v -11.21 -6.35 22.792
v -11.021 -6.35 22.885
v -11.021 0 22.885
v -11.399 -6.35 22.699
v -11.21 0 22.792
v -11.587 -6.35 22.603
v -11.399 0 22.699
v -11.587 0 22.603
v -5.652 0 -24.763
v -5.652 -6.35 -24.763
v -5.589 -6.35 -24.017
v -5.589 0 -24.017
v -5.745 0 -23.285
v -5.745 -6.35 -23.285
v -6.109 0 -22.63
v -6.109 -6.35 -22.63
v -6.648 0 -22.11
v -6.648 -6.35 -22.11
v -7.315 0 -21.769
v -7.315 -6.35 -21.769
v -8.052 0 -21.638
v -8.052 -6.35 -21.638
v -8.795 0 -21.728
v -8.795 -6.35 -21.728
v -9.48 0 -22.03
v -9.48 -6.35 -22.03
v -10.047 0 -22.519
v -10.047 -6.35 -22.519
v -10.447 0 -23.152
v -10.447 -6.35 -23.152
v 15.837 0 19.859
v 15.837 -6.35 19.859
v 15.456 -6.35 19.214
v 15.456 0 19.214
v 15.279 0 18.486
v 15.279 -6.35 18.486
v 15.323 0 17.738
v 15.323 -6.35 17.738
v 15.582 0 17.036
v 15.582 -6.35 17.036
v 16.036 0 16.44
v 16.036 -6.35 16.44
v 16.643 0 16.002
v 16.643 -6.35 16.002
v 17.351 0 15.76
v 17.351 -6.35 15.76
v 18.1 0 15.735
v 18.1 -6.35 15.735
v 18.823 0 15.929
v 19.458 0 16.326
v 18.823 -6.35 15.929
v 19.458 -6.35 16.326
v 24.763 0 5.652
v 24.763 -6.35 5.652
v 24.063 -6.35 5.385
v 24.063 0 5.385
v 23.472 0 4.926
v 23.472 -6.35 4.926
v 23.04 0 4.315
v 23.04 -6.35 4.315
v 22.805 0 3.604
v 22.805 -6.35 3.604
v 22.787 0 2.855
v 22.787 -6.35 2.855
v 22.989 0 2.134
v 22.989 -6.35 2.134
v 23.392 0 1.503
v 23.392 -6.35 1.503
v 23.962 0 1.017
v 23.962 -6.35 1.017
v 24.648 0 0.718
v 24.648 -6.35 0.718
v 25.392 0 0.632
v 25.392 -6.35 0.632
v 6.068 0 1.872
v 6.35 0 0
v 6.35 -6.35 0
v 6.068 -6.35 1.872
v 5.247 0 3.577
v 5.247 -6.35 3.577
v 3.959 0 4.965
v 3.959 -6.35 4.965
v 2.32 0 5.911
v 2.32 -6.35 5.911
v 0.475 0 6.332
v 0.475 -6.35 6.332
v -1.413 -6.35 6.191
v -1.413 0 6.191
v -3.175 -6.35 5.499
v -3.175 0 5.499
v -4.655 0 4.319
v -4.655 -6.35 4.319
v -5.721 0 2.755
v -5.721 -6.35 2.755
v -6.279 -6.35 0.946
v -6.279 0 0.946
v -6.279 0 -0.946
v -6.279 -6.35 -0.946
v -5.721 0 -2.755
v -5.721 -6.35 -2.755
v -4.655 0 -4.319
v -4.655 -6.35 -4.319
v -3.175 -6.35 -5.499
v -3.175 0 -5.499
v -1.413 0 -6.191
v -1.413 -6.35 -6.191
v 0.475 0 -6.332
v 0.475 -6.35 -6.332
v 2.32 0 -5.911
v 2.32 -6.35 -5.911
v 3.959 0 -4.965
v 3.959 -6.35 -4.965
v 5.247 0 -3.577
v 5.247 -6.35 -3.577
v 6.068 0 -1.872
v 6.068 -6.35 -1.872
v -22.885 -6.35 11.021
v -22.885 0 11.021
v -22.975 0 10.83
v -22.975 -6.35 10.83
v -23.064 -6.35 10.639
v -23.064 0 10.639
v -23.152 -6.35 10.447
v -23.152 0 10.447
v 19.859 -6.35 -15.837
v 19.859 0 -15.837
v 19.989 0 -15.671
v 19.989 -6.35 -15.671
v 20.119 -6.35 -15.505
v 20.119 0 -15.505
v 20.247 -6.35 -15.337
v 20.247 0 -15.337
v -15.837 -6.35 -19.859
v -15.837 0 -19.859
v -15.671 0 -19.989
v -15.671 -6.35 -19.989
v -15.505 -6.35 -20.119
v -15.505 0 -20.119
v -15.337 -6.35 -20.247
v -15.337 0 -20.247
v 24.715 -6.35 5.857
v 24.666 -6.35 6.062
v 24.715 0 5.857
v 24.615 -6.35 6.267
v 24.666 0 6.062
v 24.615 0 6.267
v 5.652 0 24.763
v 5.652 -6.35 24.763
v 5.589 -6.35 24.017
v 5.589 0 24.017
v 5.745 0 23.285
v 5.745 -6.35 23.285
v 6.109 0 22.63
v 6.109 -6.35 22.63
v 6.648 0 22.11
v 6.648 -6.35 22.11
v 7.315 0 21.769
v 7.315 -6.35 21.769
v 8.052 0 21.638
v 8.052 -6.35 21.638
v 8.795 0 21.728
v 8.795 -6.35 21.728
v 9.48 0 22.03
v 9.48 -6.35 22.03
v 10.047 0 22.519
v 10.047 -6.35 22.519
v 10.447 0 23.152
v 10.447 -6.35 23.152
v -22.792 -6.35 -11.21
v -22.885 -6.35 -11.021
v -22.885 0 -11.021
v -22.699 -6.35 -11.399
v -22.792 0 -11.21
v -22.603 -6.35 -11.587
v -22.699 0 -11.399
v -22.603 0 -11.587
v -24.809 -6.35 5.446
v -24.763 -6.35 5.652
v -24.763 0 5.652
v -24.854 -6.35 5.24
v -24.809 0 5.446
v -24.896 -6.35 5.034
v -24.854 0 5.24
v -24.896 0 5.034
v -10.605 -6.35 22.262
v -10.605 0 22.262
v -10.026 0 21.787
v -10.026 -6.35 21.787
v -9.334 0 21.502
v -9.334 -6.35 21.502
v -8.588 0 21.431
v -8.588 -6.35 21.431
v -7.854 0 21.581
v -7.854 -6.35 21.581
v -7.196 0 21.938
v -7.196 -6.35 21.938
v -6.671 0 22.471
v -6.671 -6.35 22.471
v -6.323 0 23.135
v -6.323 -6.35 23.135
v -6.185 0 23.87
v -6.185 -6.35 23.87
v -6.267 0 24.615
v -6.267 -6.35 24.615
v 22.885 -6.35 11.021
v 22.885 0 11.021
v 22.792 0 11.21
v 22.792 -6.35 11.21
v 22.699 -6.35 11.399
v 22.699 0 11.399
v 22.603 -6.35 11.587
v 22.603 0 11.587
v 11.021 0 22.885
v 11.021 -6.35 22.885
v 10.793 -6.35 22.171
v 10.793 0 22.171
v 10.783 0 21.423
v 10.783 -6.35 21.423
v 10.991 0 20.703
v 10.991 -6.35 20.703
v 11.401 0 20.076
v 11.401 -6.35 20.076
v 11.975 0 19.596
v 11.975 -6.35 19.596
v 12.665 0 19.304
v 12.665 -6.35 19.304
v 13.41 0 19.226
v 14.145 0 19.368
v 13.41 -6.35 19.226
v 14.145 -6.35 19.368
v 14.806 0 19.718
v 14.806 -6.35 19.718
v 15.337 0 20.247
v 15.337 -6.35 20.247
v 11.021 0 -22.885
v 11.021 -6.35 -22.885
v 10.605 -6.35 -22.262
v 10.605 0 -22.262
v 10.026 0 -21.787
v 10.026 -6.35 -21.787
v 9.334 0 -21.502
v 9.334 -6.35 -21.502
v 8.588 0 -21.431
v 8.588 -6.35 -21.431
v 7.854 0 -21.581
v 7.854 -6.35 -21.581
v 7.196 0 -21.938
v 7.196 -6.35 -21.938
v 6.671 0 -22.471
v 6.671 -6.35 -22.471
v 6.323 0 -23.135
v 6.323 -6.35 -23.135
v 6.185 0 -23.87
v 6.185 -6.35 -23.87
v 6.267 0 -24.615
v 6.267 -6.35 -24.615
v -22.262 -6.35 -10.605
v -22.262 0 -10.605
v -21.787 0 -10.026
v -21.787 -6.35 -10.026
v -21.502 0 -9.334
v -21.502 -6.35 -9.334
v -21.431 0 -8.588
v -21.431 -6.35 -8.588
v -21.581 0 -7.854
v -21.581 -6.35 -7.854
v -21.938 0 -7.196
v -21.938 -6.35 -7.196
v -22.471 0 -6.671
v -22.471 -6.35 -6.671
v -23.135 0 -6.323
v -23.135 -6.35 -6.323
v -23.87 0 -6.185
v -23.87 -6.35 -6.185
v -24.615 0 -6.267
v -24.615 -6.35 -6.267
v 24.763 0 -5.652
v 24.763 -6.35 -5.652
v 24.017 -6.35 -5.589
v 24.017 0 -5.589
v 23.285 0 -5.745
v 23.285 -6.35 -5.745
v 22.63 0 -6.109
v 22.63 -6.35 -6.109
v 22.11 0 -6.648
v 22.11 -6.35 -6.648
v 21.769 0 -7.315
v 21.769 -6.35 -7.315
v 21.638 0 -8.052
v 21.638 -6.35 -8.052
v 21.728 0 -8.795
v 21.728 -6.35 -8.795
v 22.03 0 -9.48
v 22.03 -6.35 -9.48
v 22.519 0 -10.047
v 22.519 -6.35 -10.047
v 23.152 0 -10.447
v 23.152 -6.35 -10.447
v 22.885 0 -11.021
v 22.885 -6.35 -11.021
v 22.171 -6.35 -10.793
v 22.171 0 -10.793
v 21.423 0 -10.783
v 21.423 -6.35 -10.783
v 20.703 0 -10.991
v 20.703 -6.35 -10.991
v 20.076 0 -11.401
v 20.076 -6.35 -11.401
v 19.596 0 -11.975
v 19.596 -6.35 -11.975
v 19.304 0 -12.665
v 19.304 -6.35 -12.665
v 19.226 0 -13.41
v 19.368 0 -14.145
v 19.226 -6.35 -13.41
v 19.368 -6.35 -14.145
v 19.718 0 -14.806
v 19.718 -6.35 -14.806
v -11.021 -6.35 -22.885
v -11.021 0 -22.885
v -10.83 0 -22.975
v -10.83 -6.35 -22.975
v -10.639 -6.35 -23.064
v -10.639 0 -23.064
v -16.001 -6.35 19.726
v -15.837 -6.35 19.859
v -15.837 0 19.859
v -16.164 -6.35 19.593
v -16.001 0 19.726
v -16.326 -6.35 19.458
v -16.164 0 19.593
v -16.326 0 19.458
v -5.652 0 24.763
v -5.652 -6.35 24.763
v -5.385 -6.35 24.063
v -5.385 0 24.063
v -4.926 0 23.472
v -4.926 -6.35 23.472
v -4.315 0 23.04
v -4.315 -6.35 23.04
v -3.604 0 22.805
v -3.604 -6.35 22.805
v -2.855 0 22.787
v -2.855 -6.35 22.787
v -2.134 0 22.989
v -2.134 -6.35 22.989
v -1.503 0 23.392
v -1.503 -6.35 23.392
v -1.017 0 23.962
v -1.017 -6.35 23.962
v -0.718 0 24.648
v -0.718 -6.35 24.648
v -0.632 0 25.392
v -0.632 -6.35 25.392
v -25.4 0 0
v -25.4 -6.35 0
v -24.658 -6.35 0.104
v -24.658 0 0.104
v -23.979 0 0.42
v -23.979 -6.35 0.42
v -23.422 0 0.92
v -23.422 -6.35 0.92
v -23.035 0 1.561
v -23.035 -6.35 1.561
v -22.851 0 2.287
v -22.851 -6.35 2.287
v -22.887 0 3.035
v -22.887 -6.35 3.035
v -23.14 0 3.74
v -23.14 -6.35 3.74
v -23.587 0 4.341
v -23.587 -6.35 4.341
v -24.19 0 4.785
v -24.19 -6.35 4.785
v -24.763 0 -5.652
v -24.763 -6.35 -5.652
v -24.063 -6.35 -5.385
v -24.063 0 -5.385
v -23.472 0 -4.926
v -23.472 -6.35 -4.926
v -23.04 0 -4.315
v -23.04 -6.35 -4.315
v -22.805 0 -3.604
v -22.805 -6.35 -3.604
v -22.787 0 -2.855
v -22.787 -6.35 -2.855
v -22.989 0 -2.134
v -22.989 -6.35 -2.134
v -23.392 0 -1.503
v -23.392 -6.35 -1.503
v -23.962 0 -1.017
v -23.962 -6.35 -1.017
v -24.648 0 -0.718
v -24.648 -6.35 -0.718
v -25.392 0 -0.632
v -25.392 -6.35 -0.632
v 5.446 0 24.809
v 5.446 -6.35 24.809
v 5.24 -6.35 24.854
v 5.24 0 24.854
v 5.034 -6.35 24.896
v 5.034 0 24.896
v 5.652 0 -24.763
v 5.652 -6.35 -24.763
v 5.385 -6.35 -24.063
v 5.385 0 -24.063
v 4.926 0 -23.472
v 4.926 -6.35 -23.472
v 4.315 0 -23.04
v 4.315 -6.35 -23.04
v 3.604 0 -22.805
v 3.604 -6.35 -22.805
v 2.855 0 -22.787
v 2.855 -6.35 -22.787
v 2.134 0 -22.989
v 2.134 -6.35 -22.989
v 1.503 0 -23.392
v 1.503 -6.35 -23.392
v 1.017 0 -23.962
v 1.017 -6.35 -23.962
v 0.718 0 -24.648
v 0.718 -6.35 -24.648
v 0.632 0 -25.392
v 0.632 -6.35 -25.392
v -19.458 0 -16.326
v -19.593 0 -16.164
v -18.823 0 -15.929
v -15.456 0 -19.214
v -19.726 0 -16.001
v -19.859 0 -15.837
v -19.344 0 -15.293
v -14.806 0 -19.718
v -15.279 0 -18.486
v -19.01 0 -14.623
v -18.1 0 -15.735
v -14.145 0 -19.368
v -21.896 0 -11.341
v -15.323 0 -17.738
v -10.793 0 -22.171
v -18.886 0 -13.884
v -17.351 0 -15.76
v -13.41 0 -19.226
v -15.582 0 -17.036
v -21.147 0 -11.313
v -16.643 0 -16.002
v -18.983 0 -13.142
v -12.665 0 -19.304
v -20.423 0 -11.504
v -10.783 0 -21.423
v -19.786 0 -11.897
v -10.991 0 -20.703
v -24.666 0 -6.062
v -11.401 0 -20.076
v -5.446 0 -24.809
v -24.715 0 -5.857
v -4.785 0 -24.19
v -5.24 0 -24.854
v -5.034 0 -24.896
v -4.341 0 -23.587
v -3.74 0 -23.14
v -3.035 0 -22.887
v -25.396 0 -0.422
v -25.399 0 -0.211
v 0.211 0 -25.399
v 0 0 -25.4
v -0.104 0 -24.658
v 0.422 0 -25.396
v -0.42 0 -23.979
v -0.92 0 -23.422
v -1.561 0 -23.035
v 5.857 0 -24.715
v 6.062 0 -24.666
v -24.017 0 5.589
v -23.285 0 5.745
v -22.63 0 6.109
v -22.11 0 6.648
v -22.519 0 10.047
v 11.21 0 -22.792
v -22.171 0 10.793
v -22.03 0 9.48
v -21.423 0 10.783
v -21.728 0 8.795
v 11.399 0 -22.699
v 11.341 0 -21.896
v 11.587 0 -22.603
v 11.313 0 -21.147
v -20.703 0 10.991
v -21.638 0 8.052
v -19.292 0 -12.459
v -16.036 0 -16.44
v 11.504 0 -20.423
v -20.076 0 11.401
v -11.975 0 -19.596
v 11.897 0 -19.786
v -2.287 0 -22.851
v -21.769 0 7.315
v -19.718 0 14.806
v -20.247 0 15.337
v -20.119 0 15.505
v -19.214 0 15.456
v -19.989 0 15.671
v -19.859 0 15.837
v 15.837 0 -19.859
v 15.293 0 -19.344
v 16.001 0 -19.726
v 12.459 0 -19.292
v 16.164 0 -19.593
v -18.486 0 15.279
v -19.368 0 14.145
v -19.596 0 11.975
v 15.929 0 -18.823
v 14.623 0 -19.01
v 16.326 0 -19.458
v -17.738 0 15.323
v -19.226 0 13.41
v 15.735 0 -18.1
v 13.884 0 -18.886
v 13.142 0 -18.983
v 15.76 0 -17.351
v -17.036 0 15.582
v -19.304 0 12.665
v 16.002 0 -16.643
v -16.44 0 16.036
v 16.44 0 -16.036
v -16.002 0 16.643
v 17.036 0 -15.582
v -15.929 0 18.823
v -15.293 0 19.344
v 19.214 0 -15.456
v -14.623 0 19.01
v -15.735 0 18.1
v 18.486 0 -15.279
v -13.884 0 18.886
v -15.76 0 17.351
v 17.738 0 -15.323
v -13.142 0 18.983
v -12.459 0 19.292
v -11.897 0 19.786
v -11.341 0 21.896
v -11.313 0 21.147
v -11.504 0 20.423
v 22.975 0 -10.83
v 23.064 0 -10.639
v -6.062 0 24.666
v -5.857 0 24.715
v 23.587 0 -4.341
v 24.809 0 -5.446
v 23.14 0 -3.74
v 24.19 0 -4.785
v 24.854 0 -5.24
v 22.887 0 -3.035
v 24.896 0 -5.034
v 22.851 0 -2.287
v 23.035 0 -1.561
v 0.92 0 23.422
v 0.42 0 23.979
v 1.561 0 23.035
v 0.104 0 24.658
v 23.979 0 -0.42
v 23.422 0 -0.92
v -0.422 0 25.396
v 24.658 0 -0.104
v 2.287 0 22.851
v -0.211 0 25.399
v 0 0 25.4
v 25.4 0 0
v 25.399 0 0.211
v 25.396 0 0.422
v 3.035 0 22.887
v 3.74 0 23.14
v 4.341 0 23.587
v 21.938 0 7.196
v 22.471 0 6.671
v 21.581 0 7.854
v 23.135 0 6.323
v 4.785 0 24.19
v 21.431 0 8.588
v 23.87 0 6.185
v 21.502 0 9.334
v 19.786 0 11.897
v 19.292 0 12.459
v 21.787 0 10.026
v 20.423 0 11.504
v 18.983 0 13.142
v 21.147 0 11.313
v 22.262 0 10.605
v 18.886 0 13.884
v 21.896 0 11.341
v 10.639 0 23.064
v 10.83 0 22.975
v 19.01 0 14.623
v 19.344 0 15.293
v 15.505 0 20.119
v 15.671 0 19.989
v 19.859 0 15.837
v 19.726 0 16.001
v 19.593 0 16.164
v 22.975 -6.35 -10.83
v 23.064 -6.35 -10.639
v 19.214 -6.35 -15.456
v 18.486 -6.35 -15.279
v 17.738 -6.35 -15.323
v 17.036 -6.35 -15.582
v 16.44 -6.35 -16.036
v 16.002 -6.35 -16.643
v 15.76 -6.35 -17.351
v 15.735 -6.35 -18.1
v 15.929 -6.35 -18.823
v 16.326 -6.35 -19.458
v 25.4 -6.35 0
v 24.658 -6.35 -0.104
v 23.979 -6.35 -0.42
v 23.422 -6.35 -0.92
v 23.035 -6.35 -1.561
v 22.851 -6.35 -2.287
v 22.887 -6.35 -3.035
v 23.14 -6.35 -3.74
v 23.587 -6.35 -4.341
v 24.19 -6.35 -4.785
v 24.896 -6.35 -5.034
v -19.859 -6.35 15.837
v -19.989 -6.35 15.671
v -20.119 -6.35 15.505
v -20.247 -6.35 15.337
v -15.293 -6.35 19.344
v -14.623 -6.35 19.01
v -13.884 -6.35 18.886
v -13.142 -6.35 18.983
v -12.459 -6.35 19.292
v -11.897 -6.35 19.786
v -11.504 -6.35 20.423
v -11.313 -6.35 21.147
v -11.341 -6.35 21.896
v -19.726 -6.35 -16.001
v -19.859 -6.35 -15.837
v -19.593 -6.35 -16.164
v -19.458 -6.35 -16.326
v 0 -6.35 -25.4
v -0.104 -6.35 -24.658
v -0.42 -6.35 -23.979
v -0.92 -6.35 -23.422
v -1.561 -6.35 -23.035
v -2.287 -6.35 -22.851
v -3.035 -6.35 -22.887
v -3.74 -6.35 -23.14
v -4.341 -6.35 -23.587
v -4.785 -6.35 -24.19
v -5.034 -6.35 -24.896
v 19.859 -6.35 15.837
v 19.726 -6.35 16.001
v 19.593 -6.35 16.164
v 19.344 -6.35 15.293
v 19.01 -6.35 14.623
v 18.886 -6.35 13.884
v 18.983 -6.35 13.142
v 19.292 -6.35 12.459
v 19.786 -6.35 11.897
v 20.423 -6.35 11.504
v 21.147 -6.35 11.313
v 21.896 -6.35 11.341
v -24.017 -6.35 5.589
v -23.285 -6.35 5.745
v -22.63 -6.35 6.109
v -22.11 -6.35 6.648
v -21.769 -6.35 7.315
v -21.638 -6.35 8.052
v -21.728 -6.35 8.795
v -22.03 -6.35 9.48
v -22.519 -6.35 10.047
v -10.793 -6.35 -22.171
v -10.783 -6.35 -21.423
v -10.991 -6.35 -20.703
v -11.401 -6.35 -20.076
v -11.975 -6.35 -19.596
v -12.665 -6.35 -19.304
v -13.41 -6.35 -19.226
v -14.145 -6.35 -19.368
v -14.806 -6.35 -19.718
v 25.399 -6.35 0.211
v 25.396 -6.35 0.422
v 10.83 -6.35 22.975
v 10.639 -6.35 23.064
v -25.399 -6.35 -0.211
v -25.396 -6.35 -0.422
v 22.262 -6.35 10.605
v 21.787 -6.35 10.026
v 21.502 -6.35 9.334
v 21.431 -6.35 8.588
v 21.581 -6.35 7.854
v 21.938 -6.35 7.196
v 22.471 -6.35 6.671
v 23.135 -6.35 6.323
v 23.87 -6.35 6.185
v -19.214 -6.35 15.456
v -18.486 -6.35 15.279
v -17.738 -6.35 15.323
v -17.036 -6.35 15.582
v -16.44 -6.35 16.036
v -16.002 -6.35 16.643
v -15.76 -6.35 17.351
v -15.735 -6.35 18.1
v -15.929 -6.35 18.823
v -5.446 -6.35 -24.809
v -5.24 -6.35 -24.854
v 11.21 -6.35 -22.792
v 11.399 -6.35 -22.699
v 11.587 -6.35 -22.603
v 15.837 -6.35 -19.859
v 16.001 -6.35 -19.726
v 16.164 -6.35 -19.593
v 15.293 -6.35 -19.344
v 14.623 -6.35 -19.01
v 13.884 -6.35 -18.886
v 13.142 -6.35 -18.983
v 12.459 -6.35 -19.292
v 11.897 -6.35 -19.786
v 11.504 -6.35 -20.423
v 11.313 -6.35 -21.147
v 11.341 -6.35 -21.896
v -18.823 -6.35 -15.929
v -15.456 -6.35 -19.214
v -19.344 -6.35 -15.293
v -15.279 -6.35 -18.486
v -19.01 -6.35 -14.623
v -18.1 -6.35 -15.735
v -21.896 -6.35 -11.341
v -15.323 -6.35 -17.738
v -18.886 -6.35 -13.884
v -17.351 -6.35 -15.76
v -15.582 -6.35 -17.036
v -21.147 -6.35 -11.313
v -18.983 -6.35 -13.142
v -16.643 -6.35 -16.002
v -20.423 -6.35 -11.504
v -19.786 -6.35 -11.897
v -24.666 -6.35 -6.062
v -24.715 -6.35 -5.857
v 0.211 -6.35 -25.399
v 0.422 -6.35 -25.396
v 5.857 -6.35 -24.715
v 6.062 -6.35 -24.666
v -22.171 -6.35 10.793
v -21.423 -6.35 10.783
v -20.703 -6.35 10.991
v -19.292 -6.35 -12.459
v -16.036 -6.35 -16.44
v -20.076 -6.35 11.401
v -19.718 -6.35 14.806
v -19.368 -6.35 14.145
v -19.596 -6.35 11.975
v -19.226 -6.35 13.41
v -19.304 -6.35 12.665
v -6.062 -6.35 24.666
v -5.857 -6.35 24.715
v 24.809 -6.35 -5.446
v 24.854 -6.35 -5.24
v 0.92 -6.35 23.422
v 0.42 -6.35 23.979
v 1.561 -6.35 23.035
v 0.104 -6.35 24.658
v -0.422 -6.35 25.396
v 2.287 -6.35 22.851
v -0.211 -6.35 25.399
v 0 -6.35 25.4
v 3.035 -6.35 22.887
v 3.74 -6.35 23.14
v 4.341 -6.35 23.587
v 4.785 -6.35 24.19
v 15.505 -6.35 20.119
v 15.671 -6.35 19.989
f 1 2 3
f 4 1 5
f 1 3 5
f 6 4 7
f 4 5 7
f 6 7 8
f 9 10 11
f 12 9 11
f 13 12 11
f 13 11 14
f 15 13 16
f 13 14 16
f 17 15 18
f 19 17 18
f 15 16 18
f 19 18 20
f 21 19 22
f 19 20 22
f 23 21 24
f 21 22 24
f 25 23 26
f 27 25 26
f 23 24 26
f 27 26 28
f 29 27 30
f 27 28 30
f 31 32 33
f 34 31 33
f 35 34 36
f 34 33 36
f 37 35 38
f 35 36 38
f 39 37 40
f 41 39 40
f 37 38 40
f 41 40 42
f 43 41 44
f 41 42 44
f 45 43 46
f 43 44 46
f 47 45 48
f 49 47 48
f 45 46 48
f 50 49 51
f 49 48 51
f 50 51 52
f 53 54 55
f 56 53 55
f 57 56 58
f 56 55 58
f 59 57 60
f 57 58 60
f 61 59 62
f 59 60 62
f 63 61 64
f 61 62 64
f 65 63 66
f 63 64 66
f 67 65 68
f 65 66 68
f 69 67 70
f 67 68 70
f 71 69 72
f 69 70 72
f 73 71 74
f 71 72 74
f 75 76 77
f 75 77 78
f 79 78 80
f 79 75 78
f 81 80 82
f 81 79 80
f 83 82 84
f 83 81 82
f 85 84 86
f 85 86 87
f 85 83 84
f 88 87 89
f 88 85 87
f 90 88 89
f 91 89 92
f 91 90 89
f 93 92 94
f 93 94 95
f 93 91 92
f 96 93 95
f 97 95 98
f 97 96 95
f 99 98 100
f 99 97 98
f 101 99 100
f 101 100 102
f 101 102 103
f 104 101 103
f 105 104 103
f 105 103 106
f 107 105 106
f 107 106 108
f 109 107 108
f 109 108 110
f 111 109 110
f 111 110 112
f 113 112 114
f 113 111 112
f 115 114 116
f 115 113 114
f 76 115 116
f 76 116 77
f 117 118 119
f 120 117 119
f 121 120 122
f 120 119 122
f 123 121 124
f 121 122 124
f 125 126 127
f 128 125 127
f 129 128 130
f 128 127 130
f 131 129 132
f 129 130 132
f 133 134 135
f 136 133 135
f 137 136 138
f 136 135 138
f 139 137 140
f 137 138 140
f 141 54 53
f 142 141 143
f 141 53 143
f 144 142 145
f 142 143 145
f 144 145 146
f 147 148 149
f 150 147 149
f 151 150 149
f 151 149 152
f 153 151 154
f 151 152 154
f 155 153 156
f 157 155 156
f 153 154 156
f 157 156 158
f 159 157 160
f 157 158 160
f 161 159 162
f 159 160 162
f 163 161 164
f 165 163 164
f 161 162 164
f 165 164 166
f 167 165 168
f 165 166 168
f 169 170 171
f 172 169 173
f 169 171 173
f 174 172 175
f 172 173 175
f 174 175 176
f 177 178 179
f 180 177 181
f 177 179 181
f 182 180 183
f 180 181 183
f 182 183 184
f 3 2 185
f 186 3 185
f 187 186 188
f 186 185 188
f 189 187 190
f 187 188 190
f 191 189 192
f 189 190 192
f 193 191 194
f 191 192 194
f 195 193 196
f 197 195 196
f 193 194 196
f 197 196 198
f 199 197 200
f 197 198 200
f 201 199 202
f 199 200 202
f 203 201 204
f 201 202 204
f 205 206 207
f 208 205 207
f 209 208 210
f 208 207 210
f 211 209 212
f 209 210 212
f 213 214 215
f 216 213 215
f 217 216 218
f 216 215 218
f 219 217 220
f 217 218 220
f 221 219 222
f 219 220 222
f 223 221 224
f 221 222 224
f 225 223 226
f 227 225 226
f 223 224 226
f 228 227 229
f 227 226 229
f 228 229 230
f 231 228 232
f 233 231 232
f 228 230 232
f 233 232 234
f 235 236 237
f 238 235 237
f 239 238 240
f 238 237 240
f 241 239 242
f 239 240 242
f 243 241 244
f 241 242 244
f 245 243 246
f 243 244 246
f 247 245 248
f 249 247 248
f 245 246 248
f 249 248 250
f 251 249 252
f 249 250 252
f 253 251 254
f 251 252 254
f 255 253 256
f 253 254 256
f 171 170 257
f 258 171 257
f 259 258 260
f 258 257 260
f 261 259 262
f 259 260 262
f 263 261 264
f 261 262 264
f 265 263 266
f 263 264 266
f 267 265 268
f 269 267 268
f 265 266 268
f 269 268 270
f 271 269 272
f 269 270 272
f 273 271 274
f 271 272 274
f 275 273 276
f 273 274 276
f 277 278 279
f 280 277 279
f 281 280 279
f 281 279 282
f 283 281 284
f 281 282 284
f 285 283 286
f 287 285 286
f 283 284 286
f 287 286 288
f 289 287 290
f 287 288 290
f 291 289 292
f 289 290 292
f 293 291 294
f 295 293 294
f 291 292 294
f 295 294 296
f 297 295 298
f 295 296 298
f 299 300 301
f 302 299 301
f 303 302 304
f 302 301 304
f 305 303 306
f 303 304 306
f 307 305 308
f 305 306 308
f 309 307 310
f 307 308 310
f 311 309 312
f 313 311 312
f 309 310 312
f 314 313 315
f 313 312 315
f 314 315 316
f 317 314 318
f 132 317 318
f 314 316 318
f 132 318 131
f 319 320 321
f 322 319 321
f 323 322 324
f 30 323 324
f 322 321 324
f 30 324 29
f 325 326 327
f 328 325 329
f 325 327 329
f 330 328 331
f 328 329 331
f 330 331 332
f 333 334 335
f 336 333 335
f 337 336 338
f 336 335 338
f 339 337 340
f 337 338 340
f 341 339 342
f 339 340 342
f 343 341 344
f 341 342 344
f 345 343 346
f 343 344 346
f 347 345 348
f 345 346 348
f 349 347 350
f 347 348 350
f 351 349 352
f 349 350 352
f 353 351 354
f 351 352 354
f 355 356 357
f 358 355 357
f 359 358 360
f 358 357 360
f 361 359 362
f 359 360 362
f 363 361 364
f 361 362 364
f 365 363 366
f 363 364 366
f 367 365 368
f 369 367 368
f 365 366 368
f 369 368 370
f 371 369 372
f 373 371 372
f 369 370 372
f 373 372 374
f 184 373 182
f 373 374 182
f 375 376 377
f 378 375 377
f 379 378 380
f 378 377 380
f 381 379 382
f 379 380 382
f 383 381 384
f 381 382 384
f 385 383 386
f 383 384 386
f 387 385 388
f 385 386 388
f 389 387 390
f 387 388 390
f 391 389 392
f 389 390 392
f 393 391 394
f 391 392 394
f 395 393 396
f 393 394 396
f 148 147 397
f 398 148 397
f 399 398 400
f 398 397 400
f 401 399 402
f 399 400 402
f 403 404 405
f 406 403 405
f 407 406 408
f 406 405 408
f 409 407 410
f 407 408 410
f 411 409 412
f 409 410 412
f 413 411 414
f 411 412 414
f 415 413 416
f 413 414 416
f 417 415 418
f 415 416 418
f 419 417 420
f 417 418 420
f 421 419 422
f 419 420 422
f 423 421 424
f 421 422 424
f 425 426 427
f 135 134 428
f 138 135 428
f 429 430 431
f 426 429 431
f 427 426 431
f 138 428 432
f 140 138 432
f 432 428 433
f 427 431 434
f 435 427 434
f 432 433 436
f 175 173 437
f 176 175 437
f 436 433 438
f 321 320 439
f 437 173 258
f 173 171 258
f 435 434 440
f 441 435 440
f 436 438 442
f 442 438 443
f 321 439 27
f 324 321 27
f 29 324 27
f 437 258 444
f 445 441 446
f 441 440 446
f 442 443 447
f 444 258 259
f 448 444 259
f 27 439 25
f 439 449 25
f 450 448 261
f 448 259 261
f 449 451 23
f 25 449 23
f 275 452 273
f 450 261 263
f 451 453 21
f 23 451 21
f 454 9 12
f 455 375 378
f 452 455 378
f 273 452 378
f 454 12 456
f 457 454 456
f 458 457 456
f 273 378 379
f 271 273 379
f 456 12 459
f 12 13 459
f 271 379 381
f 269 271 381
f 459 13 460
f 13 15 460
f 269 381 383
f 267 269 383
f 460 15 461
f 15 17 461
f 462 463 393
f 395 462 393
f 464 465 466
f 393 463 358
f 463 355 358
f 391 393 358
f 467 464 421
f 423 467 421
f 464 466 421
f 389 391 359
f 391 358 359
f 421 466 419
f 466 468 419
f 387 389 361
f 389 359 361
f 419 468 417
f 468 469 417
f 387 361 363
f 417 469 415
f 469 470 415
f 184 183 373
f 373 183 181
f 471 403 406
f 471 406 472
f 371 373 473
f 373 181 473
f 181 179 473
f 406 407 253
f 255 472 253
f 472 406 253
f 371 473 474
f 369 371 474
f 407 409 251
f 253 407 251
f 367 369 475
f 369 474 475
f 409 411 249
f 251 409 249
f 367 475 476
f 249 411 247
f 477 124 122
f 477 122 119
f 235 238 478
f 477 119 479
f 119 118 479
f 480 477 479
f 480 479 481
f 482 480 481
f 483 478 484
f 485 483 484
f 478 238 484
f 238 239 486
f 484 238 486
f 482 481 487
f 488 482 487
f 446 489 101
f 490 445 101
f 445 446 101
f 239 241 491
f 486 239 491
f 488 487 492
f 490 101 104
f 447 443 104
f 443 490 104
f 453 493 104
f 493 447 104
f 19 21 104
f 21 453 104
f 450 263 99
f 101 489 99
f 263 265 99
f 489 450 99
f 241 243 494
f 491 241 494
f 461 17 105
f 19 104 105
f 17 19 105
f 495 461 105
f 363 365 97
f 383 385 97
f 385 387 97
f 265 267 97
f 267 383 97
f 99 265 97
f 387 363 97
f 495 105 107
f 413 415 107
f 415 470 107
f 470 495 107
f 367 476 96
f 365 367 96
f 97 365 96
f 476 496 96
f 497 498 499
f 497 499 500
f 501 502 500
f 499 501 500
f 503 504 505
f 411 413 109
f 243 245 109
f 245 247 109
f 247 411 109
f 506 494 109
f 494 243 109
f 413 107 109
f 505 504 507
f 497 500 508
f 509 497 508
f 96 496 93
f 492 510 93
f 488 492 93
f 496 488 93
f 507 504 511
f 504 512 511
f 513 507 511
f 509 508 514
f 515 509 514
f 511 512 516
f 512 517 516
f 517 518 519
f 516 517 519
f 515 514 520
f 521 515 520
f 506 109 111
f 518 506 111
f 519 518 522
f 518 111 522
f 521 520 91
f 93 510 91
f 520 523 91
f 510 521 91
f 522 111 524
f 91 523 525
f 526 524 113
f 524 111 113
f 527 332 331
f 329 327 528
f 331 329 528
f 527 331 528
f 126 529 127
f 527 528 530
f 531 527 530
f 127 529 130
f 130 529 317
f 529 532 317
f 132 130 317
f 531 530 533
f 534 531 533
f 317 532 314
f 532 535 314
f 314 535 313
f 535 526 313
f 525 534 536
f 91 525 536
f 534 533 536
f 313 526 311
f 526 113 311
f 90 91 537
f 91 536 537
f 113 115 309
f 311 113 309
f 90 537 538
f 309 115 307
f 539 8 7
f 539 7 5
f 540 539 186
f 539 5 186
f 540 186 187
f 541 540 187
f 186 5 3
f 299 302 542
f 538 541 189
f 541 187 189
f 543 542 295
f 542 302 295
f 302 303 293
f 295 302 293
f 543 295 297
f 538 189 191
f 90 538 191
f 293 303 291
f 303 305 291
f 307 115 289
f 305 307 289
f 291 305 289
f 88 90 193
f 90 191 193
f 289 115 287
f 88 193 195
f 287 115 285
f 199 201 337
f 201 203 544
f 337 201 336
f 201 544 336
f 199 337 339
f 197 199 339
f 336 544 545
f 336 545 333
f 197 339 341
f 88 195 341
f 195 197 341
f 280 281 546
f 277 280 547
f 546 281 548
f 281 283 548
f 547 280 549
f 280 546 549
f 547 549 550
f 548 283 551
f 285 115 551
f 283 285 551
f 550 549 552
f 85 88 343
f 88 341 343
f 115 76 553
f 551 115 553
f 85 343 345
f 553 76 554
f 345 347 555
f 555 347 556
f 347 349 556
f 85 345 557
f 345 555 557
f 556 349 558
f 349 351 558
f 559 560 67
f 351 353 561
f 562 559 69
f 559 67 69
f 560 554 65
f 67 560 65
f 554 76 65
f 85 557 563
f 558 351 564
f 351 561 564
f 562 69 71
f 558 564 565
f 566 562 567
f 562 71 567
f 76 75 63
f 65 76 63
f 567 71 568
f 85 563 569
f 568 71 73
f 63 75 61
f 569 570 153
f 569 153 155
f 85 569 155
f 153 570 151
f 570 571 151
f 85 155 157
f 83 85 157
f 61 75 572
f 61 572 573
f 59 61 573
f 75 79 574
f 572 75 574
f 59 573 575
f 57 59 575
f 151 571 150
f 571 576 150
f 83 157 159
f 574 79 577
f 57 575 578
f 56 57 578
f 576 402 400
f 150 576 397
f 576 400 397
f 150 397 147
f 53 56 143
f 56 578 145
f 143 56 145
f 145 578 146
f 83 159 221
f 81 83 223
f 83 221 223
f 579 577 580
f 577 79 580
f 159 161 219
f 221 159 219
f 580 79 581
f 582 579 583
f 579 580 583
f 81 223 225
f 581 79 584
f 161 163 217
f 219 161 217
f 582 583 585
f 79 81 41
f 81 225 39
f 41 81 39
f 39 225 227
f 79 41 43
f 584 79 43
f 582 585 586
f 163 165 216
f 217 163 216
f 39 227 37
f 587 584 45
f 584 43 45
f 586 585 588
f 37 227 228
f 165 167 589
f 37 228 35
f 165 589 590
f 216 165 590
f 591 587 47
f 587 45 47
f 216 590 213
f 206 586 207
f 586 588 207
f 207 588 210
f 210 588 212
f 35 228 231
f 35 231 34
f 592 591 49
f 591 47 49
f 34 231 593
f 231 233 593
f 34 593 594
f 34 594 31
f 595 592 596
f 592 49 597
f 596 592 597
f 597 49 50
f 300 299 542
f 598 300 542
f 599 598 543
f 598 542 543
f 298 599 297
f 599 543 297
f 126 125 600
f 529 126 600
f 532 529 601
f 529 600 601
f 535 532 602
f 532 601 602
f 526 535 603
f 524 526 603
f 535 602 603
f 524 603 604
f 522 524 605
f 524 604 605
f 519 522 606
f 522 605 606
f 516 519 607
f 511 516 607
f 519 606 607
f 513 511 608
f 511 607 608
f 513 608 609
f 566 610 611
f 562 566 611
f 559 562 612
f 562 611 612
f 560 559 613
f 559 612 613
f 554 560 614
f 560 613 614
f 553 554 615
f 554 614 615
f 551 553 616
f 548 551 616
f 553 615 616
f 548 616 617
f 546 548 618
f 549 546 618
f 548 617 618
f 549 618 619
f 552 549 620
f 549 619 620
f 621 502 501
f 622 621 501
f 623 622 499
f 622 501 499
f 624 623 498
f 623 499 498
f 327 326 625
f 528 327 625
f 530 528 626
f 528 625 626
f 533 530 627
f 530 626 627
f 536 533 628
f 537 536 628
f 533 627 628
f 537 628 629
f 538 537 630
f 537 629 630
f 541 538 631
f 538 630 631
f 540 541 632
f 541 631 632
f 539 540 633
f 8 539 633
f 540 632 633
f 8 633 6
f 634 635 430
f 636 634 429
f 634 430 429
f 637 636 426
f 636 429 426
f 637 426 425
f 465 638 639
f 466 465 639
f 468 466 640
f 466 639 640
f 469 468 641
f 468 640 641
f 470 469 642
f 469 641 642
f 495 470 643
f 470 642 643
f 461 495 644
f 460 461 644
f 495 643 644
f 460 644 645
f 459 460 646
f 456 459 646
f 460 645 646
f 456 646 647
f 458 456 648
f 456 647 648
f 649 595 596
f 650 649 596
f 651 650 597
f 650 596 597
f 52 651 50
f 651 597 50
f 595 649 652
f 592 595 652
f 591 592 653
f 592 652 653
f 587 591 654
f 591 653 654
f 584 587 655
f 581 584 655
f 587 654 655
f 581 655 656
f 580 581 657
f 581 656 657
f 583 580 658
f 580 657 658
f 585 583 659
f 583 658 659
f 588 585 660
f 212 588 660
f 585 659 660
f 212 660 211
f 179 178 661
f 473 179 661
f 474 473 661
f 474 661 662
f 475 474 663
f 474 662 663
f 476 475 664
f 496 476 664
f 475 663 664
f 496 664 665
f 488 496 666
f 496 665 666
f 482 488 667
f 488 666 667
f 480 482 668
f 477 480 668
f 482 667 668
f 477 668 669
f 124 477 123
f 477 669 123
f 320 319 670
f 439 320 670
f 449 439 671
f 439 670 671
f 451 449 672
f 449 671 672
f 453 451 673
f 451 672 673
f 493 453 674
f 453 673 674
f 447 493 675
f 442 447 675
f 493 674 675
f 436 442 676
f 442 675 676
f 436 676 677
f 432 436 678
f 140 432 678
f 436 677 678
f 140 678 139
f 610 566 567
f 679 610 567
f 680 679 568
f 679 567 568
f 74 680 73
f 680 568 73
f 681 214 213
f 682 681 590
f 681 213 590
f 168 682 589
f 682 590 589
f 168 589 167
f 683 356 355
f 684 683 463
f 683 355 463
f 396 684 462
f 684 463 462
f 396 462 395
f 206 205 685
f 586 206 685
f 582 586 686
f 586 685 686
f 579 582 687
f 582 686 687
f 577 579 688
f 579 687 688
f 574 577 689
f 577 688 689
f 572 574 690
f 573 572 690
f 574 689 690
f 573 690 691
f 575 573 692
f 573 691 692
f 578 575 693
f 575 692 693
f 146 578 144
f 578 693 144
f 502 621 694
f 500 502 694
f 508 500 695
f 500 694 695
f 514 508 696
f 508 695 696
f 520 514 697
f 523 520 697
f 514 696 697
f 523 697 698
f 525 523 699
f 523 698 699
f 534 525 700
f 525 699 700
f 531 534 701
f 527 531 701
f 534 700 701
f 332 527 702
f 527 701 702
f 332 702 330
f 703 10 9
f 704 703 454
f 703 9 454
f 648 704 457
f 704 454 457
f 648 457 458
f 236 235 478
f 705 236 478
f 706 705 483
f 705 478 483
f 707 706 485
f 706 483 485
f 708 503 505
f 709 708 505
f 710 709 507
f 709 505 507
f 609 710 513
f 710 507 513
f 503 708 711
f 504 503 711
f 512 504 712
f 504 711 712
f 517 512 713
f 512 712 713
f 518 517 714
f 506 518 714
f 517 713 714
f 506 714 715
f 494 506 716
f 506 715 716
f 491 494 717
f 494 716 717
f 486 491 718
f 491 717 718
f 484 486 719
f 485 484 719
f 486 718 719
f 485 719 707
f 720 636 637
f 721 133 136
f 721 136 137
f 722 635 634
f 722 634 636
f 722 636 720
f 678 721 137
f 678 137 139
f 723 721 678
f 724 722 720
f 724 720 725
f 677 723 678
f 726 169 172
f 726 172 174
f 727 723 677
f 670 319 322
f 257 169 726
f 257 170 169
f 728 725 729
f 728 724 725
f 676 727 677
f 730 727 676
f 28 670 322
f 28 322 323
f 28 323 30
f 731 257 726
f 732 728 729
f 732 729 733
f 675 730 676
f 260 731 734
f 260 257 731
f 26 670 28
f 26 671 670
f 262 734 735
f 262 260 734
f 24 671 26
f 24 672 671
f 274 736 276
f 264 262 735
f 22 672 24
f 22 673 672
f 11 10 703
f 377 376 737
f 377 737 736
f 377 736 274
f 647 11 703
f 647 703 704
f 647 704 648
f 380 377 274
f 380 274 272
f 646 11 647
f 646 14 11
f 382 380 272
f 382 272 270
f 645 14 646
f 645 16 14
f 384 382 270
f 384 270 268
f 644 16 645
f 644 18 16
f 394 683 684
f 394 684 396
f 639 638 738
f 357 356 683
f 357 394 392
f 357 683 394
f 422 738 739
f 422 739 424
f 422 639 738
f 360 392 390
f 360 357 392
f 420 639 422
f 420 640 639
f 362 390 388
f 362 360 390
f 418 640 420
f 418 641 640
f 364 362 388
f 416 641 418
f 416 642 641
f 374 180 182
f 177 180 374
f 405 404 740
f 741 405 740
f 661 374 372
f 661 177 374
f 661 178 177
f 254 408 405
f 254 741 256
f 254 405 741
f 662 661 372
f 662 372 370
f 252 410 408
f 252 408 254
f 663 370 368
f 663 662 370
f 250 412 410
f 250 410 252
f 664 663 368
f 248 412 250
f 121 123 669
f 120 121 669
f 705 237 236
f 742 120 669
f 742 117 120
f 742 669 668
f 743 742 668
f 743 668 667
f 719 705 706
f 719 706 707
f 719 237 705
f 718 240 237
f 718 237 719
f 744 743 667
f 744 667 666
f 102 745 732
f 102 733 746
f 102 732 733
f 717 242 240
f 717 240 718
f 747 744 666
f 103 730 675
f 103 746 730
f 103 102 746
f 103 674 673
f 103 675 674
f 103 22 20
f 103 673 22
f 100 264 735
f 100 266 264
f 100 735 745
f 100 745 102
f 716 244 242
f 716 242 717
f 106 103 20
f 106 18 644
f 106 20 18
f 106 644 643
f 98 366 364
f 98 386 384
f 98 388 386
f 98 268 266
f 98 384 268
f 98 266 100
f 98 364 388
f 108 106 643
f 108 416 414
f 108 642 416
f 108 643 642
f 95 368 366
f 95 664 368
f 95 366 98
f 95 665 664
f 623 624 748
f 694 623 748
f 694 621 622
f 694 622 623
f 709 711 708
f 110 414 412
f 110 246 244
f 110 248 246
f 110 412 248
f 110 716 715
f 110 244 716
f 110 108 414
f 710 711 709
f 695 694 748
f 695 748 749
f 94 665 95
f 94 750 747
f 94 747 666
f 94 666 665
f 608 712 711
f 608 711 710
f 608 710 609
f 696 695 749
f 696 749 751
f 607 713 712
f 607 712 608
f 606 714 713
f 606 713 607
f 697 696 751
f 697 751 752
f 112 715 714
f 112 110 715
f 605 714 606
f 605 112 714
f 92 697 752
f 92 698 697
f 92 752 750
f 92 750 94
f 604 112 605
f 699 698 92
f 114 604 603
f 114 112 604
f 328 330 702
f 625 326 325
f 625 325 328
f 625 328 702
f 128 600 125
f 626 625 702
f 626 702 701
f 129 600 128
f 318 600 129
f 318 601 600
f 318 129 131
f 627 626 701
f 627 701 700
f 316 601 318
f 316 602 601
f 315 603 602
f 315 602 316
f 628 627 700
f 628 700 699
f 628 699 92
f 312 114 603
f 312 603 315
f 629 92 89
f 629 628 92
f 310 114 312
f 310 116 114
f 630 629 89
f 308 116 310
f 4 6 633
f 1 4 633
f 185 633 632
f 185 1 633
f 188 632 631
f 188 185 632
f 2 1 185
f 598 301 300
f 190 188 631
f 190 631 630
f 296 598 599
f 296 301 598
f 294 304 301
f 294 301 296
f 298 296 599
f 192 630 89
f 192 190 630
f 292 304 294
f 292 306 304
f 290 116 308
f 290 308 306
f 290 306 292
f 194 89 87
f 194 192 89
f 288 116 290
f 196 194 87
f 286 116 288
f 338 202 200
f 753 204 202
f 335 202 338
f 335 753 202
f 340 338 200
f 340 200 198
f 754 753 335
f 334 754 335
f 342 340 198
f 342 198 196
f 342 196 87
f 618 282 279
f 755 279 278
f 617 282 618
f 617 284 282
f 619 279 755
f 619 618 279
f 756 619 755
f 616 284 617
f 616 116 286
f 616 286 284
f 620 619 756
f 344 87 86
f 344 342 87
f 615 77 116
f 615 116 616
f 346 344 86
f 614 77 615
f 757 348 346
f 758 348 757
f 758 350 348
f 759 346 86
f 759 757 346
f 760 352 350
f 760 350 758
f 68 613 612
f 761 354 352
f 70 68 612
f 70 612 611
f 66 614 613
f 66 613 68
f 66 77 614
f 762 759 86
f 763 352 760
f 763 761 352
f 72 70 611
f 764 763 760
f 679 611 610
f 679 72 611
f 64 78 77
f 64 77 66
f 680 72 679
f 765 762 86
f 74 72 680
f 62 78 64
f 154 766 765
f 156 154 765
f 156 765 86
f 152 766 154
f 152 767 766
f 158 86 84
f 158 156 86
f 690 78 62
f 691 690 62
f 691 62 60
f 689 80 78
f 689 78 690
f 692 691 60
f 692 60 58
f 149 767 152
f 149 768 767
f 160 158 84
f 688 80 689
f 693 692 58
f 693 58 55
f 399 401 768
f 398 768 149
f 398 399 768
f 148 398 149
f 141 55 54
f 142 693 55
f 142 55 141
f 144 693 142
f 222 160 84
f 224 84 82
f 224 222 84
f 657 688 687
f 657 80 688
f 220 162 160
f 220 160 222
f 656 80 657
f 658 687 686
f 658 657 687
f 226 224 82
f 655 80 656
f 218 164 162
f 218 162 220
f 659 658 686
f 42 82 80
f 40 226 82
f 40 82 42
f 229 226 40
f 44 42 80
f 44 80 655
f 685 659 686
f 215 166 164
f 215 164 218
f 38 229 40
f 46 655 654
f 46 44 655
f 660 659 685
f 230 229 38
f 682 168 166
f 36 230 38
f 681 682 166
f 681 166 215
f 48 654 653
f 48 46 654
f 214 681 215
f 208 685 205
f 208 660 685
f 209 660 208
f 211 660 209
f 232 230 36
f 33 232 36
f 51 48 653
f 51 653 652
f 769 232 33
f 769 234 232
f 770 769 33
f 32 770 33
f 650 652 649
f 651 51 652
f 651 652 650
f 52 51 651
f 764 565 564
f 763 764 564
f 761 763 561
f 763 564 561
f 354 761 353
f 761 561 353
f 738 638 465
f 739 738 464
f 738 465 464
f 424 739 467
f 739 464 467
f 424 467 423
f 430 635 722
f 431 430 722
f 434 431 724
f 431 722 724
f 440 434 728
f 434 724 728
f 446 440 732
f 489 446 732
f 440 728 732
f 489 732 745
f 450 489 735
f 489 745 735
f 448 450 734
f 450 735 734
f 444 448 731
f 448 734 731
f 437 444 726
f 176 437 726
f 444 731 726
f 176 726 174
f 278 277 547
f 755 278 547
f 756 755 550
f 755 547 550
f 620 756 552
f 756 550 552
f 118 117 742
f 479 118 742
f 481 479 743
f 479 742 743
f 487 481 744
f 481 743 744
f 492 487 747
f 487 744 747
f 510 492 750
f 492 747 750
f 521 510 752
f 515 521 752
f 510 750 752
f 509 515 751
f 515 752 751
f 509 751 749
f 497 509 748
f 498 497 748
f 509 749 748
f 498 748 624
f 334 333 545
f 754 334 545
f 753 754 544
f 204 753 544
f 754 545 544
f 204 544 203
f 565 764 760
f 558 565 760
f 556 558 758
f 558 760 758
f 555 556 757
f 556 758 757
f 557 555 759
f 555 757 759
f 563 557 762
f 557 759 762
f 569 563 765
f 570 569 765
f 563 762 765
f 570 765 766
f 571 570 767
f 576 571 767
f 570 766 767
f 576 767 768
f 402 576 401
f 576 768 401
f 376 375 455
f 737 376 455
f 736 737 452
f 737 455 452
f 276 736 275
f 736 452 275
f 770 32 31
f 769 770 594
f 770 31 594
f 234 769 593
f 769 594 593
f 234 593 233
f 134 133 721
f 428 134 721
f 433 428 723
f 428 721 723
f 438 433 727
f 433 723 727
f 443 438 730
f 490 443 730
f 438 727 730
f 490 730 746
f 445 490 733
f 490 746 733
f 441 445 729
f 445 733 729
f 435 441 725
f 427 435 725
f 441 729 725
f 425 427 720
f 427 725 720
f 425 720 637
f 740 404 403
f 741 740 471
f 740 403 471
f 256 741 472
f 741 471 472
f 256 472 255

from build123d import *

# Parameters (mm, degrees)
F0_R     = 25.4
F0_R_2   = 6.35
F1_DEPTH = 6.35
F3_DEPTH = 6.351


with BuildPart() as f1:
    # F0 (on Front) → F1 (new body)
    with BuildSketch(Plane.XZ):
        Circle(F0_R)
        Circle(F0_R_2, mode=Mode.SUBTRACT)
    extrude(amount=F1_DEPTH)

    # F2 (on face) → F3 (cut, through all)
    with BuildSketch(Plane.XZ.offset(6.35)):
        with BuildLine():
            ThreePointArc((-5.6520317225, 24.7631689694), (-2.8552519313, 22.7872201957), (-0.6324557251, 25.3921247586))
            ThreePointArc((-0.6324557251, 25.3921247586), (-3.157941096, 25.2029245929), (-5.6520317225, 24.7631689694))
        make_face()
        with BuildLine():
            ThreePointArc((5.0336805768, 24.8962258154), (2.5294133993, 25.2737426563), (0, 25.4))
            ThreePointArc((0, 25.4), (2.286968716, 22.8512503362), (5.0336805768, 24.8962258154))
        make_face()
        with BuildLine():
            ThreePointArc((24.8962258154, -5.0336805768), (25.2737426563, -2.5294133993), (25.4, 0))
            ThreePointArc((25.4, 0), (22.8512503362, -2.286968716), (24.8962258154, -5.0336805768))
        make_face()
        with BuildLine():
            ThreePointArc((23.1519261522, -10.4474071158), (24.0772297289, -8.0899325449), (24.7631689694, -5.6520317225))
            ThreePointArc((24.7631689694, -5.6520317225), (21.7694233664, -7.3145112024), (23.1519261522, -10.4474071158))
        make_face()
        with BuildLine():
            ThreePointArc((20.2466922377, -15.3372570374), (21.6733839652, -13.244788692), (22.8846092447, -11.0206469736))
            ThreePointArc((22.8846092447, -11.0206469736), (19.5959866078, -11.9752735544), (20.2466922377, -15.3372570374))
        make_face()
        with BuildLine():
            ThreePointArc((16.3262046316, -19.4580328483), (18.1827442293, -17.7354958288), (19.8585196547, -15.8366409672))
            ThreePointArc((19.8585196547, -15.8366409672), (16.439925255, -16.035545686), (16.3262046316, -19.4580328483))
        make_face()
        with BuildLine():
            ThreePointArc((11.587052953, -22.6031016426), (13.7803457732, -21.3368711476), (15.8366409672, -19.8585196547))
            ThreePointArc((15.8366409672, -19.8585196547), (12.4594974028, -19.2917285982), (11.587052953, -22.6031016426))
        make_face()
        with BuildLine():
            ThreePointArc((6.266878056, -24.6147565381), (8.6869432384, -23.8683266521), (11.0206469736, -22.8846092447))
            ThreePointArc((11.0206469736, -22.8846092447), (7.8542983244, -21.5805436833), (6.266878056, -24.6147565381))
        make_face()
        with BuildLine():
            ThreePointArc((0.6324557251, -25.3921247586), (3.157941096, -25.2029245929), (5.6520317225, -24.7631689694))
            ThreePointArc((5.6520317225, -24.7631689694), (2.8552519313, -22.7872201957), (0.6324557251, -25.3921247586))
        make_face()
        with BuildLine():
            ThreePointArc((0, -25.4), (-2.286968716, -22.8512503362), (-5.0336805768, -24.8962258154))
            ThreePointArc((-5.0336805768, -24.8962258154), (-2.5294133993, -25.2737426563), (0, -25.4))
        make_face()
        with BuildLine():
            ThreePointArc((-5.6520317225, -24.7631689694), (-7.3145112024, -21.7694233664), (-10.4474071158, -23.1519261522))
            ThreePointArc((-10.4474071158, -23.1519261522), (-8.0899325449, -24.0772297289), (-5.6520317225, -24.7631689694))
        make_face()
        with BuildLine():
            ThreePointArc((-11.0206469736, -22.8846092447), (-11.9752735544, -19.5959866078), (-15.3372570374, -20.2466922377))
            ThreePointArc((-15.3372570374, -20.2466922377), (-13.244788692, -21.6733839652), (-11.0206469736, -22.8846092447))
        make_face()
        with BuildLine():
            ThreePointArc((-15.8366409672, -19.8585196547), (-16.035545686, -16.439925255), (-19.4580328483, -16.3262046316))
            ThreePointArc((-19.4580328483, -16.3262046316), (-17.7354958288, -18.1827442293), (-15.8366409672, -19.8585196547))
        make_face()
        with BuildLine():
            ThreePointArc((-19.8585196547, -15.8366409672), (-19.2917285982, -12.4594974028), (-22.6031016426, -11.587052953))
            ThreePointArc((-22.6031016426, -11.587052953), (-21.3368711476, -13.7803457732), (-19.8585196547, -15.8366409672))
        make_face()
        with BuildLine():
            ThreePointArc((-22.8846092447, -11.0206469736), (-21.5805436833, -7.8542983244), (-24.6147565381, -6.266878056))
            ThreePointArc((-24.6147565381, -6.266878056), (-23.8683266521, -8.6869432384), (-22.8846092447, -11.0206469736))
        make_face()
        with BuildLine():
            ThreePointArc((-24.7631689694, -5.6520317225), (-22.7872201957, -2.8552519313), (-25.3921247586, -0.6324557251))
            ThreePointArc((-25.3921247586, -0.6324557251), (-25.2029245929, -3.157941096), (-24.7631689694, -5.6520317225))
        make_face()
        with BuildLine():
            ThreePointArc((-25.4, 0), (-22.8512503362, 2.286968716), (-24.8962258154, 5.0336805768))
            ThreePointArc((-24.8962258154, 5.0336805768), (-25.2737426563, 2.5294133993), (-25.4, 0))
        make_face()
        with BuildLine():
            ThreePointArc((-24.7631689694, 5.6520317225), (-21.7694233664, 7.3145112024), (-23.1519261522, 10.4474071158))
            ThreePointArc((-23.1519261522, 10.4474071158), (-24.0772297289, 8.0899325449), (-24.7631689694, 5.6520317225))
        make_face()
        with BuildLine():
            ThreePointArc((-22.8846092447, 11.0206469736), (-19.5959866078, 11.9752735544), (-20.2466922377, 15.3372570374))
            ThreePointArc((-20.2466922377, 15.3372570374), (-21.6733839652, 13.244788692), (-22.8846092447, 11.0206469736))
        make_face()
        with BuildLine():
            ThreePointArc((-19.8585196547, 15.8366409672), (-16.439925255, 16.035545686), (-16.3262046316, 19.4580328483))
            ThreePointArc((-16.3262046316, 19.4580328483), (-18.1827442293, 17.7354958288), (-19.8585196547, 15.8366409672))
        make_face()
        with BuildLine():
            ThreePointArc((-15.8366409672, 19.8585196547), (-12.4594974028, 19.2917285982), (-11.587052953, 22.6031016426))
            ThreePointArc((-11.587052953, 22.6031016426), (-13.7803457732, 21.3368711476), (-15.8366409672, 19.8585196547))
        make_face()
        with BuildLine():
            ThreePointArc((-11.0206469736, 22.8846092447), (-7.8542983244, 21.5805436833), (-6.266878056, 24.6147565381))
            ThreePointArc((-6.266878056, 24.6147565381), (-8.6869432384, 23.8683266521), (-11.0206469736, 22.8846092447))
        make_face()
        with BuildLine():
            ThreePointArc((10.4474071158, 23.1519261522), (8.0899325449, 24.0772297289), (5.6520317225, 24.7631689694))
            ThreePointArc((5.6520317225, 24.7631689694), (7.3145112024, 21.7694233664), (10.4474071158, 23.1519261522))
        make_face()
        with BuildLine():
            ThreePointArc((15.3372570374, 20.2466922377), (13.244788692, 21.6733839652), (11.0206469736, 22.8846092447))
            ThreePointArc((11.0206469736, 22.8846092447), (11.9752735544, 19.5959866078), (15.3372570374, 20.2466922377))
        make_face()
        with BuildLine():
            ThreePointArc((19.4580328483, 16.3262046316), (17.7354958288, 18.1827442293), (15.8366409672, 19.8585196547))
            ThreePointArc((15.8366409672, 19.8585196547), (16.035545686, 16.439925255), (19.4580328483, 16.3262046316))
        make_face()
        with BuildLine():
            ThreePointArc((22.6031016426, 11.587052953), (21.3368711476, 13.7803457732), (19.8585196547, 15.8366409672))
            ThreePointArc((19.8585196547, 15.8366409672), (19.2917285982, 12.4594974028), (22.6031016426, 11.587052953))
        make_face()
        with BuildLine():
            ThreePointArc((24.6147565381, 6.266878056), (23.8683266521, 8.6869432384), (22.8846092447, 11.0206469736))
            ThreePointArc((22.8846092447, 11.0206469736), (21.5805436833, 7.8542983244), (24.6147565381, 6.266878056))
        make_face()
        with BuildLine():
            ThreePointArc((25.3921247586, 0.6324557251), (25.2029245929, 3.157941096), (24.7631689694, 5.6520317225))
            ThreePointArc((24.7631689694, 5.6520317225), (22.7872201957, 2.8552519313), (25.3921247586, 0.6324557251))
        make_face()
    extrude(amount=-F3_DEPTH, mode=Mode.SUBTRACT)


solid = f1.part
